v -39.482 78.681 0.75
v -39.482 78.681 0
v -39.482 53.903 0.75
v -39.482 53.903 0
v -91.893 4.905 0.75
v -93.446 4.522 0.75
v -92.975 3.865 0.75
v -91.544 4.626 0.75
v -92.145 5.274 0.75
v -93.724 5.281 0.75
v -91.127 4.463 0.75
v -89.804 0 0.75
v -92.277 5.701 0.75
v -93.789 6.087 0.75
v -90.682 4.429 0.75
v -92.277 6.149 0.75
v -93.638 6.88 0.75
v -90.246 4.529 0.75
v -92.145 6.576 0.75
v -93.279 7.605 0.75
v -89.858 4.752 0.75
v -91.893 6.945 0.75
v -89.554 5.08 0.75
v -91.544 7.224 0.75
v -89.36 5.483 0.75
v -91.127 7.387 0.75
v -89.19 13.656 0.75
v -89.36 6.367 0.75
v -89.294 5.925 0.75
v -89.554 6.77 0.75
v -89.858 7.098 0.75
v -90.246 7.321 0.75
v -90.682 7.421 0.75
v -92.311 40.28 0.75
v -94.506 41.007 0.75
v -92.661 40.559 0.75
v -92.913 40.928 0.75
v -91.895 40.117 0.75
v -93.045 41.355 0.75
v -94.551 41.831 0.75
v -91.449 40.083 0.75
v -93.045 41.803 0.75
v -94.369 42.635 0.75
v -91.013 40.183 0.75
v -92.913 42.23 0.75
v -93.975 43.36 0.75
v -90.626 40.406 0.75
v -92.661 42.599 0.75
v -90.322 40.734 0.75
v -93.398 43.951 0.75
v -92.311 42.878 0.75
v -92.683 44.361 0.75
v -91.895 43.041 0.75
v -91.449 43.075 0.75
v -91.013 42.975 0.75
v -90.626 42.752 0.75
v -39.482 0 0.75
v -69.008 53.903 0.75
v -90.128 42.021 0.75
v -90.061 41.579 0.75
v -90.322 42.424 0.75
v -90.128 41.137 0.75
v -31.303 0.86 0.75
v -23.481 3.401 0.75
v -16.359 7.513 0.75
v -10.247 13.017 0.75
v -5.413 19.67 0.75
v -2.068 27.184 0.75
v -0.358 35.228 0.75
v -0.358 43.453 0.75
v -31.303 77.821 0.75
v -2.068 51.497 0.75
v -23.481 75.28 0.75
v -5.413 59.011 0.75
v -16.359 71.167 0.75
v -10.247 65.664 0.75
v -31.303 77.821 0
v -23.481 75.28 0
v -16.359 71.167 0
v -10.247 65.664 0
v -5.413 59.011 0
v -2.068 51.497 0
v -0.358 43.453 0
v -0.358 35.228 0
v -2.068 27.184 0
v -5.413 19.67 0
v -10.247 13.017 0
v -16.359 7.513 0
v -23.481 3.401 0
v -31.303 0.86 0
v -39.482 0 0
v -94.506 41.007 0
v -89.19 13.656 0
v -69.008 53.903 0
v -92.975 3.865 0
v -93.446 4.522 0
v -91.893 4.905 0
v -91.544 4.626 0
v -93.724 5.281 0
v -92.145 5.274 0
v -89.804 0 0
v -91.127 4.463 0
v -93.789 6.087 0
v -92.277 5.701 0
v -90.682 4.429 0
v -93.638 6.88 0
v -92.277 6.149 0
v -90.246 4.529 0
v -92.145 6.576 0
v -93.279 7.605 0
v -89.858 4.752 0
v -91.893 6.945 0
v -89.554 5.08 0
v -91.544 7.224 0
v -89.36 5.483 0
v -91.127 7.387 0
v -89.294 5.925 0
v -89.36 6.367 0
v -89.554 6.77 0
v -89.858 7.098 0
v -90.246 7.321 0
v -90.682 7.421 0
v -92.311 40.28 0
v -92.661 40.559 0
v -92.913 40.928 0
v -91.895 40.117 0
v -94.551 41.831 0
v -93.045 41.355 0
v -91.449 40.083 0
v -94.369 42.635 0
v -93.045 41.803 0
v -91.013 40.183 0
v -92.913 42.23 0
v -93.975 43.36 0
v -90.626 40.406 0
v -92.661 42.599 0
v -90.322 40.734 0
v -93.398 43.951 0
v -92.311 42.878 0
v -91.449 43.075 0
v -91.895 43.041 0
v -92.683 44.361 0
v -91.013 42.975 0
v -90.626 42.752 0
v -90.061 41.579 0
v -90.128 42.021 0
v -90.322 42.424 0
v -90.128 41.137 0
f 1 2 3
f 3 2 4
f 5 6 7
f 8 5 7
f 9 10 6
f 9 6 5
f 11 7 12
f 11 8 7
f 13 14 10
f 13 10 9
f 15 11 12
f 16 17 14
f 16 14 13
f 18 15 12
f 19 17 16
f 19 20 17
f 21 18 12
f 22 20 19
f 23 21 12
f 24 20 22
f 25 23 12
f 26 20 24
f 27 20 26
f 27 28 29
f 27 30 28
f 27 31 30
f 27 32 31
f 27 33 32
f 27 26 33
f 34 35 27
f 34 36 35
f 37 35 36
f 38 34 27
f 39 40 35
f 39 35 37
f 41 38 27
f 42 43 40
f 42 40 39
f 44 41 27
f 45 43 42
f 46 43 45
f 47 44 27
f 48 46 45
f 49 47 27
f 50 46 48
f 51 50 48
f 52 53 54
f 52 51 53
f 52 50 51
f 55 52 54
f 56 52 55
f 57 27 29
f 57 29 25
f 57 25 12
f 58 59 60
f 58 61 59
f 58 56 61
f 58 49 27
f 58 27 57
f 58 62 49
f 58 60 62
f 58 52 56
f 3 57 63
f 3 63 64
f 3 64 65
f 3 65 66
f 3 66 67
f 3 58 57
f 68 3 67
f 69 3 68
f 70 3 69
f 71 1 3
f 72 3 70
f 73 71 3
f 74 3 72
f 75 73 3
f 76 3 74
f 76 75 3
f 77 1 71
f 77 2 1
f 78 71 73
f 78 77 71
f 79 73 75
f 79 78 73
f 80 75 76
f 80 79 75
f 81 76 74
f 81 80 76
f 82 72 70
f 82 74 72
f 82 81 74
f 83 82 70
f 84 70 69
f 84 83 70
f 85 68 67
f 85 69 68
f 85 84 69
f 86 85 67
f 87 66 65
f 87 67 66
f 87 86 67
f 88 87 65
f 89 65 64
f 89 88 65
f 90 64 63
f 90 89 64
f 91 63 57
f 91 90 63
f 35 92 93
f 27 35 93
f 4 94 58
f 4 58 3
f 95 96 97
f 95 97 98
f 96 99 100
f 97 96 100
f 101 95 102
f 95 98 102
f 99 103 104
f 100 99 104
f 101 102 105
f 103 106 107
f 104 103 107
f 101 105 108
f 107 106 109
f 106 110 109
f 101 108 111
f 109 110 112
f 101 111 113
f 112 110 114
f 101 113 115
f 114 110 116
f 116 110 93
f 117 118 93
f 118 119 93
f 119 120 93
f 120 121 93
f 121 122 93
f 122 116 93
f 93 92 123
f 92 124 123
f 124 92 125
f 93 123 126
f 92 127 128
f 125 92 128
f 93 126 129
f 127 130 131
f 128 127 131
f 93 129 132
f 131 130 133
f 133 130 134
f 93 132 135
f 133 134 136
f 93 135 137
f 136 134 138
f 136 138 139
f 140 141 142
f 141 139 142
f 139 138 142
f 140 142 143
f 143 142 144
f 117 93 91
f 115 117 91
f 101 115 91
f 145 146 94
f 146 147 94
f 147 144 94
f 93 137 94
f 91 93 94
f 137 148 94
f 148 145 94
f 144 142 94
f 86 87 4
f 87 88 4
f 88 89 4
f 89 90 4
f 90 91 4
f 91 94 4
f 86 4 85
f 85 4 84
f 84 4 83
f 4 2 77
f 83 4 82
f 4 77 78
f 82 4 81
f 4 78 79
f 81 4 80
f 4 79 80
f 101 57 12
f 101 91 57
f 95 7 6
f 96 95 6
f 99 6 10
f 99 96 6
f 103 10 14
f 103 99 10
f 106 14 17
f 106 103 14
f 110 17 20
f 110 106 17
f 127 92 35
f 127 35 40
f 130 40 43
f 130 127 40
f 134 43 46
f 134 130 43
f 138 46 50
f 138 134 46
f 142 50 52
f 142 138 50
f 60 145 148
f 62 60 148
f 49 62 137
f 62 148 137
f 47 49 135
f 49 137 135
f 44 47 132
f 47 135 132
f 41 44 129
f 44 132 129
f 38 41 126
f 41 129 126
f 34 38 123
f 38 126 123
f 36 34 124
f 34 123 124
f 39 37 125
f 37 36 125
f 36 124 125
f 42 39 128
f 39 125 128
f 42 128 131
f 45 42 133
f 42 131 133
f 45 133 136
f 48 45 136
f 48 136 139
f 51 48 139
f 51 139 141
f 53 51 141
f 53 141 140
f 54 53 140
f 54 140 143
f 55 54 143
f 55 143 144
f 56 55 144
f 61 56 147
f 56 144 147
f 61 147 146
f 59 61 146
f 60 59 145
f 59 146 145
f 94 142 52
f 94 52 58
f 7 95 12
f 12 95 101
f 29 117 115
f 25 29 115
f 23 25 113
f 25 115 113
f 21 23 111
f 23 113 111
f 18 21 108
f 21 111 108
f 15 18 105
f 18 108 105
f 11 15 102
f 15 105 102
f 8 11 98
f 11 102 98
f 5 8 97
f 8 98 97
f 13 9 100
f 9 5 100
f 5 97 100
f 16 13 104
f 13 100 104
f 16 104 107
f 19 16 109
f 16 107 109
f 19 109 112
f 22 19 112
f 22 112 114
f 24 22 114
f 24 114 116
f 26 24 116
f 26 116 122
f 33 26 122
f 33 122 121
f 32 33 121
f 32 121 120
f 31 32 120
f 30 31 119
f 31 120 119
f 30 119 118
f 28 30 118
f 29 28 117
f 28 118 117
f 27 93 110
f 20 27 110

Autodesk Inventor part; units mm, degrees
ref_plane "YZ Plane" through (0, 0, 0) normal (1, 0, 0) x (0, 1, 0)
ref_plane "XZ Plane" through (0, 0, 0) normal (0, 1, 0) x (-1, 0, 0)
ref_plane "XY Plane" through (0, 0, 0) normal (0, 0, 1) x (1, 0, 0)
sketch "スケッチ1" plane through (0, 0, 0) normal (0, 0, 1) x (1, 0, 0)
  line L0 (44.9825, 3) -> (44.9825, 0) construction
  line L1 (44.9825, 0) -> (93.5151, 0) construction
  line L2 (44.9825, 3) -> (93.5151, 3) construction
  circle A0 centre (152.1179, -73.6808) radius 5 construction
  circle A1 centre (90.7937, -5.925) radius 3 construction
  circle A2 centre (91.5613, -41.579) radius 3 construction
  line L3 (50.9825, 0) -> (47.9825, 0) construction
  line L4 (47.9825, 0.7) -> (50.9825, 0.7) construction
  circle A3 centre (110.1553, -43.629) radius 14 construction
  circle A4 centre (105.6122, -16) radius 14 construction
  arc A5 (39.4825, -0.75) -> (39.4825, -77.9308) centre (39.4825, -39.3404) ccw construction
  line L5 (-44.9825, -3) -> (-44.9825, 0)
  line L6 (-44.9825, 0) -> (-93.5151, 0)
  line L7 (-44.9825, -3) -> (-93.5151, -3)
  circle A6 centre (-152.1179, 73.6808) radius 5
  circle A7 centre (-90.7937, 5.925) radius 3
  circle A8 centre (-91.5613, 41.579) radius 3
  line L8 (-50.9825, 0) -> (-47.9825, 0)
  line L9 (-47.9825, -0.7) -> (-50.9825, -0.7)
  circle A9 centre (-110.1553, 43.629) radius 14
  circle A10 centre (-105.6122, 16) radius 14
  arc A11 (-39.4825, 0.75) -> (-39.4825, 77.9308) centre (-39.4825, 39.3404) ccw
  line L10 (-97.013, 53.9033) -> (-2.9368, 53.9033)
  circle A12 centre (-91.5613, 41.579) radius 1.5
  circle A13 centre (-90.7937, 5.925) radius 1.5
  line L11 (-97.013, 53.9033) -> (-89.1899, 13.6565)
  line L12 (-89.1899, 13.6565) -> (-98.7082, -0.429)
  line L13 (0, 0) -> (-132.2518, 0)
  line L14 (-98.4183, 0) -> (-39.4825, 0)
  arc A14 (-39.4825, 0) -> (-39.4825, 78.6808) centre (-39.4825, 39.3404) ccw
  line L15 (-39.4825, 78.6808) -> (-39.4825, 53.9033)
  line L16 (-94.9784, 43.4362) -> (-69.0084, 53.9033)
  line L17 (-92.9751, 3.8654) -> (-89.8036, 0)
  point P0 (49.4825, 0.7)
  point P1 (-49.4825, -0.7)
  point P2 (-39.4825, 0)
  point P3 (-39.4825, 78.6808)
  point P4 (-92.6828, 44.3615)
  point P5 (-94.5062, 41.0065)
  point P6 (-44.9825, 0)
  point P7 (-89.8036, 0)
  point P8 (-93.2794, 7.6047)
  dimension "d2" = 360
  dimension "d4" = 3
  dimension "d5" = 3
  dimension "d6" = 1.5
  dimension "d7" = 41
  dimension "d8" = 79
  dimension "d9" = 17
  dimension "d11" = 0.75
  dimension "d14" = 28
  dimension "d16" = 5
extrude "押し出し1" add sketch "スケッチ1" along normal blind 0.75 contours L6 L17 A7 L12 L11 A8 L16 L10 A14 L13 | L10 A11 L15 A14 | L10 L15 A11 | A7 | A8
properties part number "回路BOX側面" material "ポリプロピレン"
